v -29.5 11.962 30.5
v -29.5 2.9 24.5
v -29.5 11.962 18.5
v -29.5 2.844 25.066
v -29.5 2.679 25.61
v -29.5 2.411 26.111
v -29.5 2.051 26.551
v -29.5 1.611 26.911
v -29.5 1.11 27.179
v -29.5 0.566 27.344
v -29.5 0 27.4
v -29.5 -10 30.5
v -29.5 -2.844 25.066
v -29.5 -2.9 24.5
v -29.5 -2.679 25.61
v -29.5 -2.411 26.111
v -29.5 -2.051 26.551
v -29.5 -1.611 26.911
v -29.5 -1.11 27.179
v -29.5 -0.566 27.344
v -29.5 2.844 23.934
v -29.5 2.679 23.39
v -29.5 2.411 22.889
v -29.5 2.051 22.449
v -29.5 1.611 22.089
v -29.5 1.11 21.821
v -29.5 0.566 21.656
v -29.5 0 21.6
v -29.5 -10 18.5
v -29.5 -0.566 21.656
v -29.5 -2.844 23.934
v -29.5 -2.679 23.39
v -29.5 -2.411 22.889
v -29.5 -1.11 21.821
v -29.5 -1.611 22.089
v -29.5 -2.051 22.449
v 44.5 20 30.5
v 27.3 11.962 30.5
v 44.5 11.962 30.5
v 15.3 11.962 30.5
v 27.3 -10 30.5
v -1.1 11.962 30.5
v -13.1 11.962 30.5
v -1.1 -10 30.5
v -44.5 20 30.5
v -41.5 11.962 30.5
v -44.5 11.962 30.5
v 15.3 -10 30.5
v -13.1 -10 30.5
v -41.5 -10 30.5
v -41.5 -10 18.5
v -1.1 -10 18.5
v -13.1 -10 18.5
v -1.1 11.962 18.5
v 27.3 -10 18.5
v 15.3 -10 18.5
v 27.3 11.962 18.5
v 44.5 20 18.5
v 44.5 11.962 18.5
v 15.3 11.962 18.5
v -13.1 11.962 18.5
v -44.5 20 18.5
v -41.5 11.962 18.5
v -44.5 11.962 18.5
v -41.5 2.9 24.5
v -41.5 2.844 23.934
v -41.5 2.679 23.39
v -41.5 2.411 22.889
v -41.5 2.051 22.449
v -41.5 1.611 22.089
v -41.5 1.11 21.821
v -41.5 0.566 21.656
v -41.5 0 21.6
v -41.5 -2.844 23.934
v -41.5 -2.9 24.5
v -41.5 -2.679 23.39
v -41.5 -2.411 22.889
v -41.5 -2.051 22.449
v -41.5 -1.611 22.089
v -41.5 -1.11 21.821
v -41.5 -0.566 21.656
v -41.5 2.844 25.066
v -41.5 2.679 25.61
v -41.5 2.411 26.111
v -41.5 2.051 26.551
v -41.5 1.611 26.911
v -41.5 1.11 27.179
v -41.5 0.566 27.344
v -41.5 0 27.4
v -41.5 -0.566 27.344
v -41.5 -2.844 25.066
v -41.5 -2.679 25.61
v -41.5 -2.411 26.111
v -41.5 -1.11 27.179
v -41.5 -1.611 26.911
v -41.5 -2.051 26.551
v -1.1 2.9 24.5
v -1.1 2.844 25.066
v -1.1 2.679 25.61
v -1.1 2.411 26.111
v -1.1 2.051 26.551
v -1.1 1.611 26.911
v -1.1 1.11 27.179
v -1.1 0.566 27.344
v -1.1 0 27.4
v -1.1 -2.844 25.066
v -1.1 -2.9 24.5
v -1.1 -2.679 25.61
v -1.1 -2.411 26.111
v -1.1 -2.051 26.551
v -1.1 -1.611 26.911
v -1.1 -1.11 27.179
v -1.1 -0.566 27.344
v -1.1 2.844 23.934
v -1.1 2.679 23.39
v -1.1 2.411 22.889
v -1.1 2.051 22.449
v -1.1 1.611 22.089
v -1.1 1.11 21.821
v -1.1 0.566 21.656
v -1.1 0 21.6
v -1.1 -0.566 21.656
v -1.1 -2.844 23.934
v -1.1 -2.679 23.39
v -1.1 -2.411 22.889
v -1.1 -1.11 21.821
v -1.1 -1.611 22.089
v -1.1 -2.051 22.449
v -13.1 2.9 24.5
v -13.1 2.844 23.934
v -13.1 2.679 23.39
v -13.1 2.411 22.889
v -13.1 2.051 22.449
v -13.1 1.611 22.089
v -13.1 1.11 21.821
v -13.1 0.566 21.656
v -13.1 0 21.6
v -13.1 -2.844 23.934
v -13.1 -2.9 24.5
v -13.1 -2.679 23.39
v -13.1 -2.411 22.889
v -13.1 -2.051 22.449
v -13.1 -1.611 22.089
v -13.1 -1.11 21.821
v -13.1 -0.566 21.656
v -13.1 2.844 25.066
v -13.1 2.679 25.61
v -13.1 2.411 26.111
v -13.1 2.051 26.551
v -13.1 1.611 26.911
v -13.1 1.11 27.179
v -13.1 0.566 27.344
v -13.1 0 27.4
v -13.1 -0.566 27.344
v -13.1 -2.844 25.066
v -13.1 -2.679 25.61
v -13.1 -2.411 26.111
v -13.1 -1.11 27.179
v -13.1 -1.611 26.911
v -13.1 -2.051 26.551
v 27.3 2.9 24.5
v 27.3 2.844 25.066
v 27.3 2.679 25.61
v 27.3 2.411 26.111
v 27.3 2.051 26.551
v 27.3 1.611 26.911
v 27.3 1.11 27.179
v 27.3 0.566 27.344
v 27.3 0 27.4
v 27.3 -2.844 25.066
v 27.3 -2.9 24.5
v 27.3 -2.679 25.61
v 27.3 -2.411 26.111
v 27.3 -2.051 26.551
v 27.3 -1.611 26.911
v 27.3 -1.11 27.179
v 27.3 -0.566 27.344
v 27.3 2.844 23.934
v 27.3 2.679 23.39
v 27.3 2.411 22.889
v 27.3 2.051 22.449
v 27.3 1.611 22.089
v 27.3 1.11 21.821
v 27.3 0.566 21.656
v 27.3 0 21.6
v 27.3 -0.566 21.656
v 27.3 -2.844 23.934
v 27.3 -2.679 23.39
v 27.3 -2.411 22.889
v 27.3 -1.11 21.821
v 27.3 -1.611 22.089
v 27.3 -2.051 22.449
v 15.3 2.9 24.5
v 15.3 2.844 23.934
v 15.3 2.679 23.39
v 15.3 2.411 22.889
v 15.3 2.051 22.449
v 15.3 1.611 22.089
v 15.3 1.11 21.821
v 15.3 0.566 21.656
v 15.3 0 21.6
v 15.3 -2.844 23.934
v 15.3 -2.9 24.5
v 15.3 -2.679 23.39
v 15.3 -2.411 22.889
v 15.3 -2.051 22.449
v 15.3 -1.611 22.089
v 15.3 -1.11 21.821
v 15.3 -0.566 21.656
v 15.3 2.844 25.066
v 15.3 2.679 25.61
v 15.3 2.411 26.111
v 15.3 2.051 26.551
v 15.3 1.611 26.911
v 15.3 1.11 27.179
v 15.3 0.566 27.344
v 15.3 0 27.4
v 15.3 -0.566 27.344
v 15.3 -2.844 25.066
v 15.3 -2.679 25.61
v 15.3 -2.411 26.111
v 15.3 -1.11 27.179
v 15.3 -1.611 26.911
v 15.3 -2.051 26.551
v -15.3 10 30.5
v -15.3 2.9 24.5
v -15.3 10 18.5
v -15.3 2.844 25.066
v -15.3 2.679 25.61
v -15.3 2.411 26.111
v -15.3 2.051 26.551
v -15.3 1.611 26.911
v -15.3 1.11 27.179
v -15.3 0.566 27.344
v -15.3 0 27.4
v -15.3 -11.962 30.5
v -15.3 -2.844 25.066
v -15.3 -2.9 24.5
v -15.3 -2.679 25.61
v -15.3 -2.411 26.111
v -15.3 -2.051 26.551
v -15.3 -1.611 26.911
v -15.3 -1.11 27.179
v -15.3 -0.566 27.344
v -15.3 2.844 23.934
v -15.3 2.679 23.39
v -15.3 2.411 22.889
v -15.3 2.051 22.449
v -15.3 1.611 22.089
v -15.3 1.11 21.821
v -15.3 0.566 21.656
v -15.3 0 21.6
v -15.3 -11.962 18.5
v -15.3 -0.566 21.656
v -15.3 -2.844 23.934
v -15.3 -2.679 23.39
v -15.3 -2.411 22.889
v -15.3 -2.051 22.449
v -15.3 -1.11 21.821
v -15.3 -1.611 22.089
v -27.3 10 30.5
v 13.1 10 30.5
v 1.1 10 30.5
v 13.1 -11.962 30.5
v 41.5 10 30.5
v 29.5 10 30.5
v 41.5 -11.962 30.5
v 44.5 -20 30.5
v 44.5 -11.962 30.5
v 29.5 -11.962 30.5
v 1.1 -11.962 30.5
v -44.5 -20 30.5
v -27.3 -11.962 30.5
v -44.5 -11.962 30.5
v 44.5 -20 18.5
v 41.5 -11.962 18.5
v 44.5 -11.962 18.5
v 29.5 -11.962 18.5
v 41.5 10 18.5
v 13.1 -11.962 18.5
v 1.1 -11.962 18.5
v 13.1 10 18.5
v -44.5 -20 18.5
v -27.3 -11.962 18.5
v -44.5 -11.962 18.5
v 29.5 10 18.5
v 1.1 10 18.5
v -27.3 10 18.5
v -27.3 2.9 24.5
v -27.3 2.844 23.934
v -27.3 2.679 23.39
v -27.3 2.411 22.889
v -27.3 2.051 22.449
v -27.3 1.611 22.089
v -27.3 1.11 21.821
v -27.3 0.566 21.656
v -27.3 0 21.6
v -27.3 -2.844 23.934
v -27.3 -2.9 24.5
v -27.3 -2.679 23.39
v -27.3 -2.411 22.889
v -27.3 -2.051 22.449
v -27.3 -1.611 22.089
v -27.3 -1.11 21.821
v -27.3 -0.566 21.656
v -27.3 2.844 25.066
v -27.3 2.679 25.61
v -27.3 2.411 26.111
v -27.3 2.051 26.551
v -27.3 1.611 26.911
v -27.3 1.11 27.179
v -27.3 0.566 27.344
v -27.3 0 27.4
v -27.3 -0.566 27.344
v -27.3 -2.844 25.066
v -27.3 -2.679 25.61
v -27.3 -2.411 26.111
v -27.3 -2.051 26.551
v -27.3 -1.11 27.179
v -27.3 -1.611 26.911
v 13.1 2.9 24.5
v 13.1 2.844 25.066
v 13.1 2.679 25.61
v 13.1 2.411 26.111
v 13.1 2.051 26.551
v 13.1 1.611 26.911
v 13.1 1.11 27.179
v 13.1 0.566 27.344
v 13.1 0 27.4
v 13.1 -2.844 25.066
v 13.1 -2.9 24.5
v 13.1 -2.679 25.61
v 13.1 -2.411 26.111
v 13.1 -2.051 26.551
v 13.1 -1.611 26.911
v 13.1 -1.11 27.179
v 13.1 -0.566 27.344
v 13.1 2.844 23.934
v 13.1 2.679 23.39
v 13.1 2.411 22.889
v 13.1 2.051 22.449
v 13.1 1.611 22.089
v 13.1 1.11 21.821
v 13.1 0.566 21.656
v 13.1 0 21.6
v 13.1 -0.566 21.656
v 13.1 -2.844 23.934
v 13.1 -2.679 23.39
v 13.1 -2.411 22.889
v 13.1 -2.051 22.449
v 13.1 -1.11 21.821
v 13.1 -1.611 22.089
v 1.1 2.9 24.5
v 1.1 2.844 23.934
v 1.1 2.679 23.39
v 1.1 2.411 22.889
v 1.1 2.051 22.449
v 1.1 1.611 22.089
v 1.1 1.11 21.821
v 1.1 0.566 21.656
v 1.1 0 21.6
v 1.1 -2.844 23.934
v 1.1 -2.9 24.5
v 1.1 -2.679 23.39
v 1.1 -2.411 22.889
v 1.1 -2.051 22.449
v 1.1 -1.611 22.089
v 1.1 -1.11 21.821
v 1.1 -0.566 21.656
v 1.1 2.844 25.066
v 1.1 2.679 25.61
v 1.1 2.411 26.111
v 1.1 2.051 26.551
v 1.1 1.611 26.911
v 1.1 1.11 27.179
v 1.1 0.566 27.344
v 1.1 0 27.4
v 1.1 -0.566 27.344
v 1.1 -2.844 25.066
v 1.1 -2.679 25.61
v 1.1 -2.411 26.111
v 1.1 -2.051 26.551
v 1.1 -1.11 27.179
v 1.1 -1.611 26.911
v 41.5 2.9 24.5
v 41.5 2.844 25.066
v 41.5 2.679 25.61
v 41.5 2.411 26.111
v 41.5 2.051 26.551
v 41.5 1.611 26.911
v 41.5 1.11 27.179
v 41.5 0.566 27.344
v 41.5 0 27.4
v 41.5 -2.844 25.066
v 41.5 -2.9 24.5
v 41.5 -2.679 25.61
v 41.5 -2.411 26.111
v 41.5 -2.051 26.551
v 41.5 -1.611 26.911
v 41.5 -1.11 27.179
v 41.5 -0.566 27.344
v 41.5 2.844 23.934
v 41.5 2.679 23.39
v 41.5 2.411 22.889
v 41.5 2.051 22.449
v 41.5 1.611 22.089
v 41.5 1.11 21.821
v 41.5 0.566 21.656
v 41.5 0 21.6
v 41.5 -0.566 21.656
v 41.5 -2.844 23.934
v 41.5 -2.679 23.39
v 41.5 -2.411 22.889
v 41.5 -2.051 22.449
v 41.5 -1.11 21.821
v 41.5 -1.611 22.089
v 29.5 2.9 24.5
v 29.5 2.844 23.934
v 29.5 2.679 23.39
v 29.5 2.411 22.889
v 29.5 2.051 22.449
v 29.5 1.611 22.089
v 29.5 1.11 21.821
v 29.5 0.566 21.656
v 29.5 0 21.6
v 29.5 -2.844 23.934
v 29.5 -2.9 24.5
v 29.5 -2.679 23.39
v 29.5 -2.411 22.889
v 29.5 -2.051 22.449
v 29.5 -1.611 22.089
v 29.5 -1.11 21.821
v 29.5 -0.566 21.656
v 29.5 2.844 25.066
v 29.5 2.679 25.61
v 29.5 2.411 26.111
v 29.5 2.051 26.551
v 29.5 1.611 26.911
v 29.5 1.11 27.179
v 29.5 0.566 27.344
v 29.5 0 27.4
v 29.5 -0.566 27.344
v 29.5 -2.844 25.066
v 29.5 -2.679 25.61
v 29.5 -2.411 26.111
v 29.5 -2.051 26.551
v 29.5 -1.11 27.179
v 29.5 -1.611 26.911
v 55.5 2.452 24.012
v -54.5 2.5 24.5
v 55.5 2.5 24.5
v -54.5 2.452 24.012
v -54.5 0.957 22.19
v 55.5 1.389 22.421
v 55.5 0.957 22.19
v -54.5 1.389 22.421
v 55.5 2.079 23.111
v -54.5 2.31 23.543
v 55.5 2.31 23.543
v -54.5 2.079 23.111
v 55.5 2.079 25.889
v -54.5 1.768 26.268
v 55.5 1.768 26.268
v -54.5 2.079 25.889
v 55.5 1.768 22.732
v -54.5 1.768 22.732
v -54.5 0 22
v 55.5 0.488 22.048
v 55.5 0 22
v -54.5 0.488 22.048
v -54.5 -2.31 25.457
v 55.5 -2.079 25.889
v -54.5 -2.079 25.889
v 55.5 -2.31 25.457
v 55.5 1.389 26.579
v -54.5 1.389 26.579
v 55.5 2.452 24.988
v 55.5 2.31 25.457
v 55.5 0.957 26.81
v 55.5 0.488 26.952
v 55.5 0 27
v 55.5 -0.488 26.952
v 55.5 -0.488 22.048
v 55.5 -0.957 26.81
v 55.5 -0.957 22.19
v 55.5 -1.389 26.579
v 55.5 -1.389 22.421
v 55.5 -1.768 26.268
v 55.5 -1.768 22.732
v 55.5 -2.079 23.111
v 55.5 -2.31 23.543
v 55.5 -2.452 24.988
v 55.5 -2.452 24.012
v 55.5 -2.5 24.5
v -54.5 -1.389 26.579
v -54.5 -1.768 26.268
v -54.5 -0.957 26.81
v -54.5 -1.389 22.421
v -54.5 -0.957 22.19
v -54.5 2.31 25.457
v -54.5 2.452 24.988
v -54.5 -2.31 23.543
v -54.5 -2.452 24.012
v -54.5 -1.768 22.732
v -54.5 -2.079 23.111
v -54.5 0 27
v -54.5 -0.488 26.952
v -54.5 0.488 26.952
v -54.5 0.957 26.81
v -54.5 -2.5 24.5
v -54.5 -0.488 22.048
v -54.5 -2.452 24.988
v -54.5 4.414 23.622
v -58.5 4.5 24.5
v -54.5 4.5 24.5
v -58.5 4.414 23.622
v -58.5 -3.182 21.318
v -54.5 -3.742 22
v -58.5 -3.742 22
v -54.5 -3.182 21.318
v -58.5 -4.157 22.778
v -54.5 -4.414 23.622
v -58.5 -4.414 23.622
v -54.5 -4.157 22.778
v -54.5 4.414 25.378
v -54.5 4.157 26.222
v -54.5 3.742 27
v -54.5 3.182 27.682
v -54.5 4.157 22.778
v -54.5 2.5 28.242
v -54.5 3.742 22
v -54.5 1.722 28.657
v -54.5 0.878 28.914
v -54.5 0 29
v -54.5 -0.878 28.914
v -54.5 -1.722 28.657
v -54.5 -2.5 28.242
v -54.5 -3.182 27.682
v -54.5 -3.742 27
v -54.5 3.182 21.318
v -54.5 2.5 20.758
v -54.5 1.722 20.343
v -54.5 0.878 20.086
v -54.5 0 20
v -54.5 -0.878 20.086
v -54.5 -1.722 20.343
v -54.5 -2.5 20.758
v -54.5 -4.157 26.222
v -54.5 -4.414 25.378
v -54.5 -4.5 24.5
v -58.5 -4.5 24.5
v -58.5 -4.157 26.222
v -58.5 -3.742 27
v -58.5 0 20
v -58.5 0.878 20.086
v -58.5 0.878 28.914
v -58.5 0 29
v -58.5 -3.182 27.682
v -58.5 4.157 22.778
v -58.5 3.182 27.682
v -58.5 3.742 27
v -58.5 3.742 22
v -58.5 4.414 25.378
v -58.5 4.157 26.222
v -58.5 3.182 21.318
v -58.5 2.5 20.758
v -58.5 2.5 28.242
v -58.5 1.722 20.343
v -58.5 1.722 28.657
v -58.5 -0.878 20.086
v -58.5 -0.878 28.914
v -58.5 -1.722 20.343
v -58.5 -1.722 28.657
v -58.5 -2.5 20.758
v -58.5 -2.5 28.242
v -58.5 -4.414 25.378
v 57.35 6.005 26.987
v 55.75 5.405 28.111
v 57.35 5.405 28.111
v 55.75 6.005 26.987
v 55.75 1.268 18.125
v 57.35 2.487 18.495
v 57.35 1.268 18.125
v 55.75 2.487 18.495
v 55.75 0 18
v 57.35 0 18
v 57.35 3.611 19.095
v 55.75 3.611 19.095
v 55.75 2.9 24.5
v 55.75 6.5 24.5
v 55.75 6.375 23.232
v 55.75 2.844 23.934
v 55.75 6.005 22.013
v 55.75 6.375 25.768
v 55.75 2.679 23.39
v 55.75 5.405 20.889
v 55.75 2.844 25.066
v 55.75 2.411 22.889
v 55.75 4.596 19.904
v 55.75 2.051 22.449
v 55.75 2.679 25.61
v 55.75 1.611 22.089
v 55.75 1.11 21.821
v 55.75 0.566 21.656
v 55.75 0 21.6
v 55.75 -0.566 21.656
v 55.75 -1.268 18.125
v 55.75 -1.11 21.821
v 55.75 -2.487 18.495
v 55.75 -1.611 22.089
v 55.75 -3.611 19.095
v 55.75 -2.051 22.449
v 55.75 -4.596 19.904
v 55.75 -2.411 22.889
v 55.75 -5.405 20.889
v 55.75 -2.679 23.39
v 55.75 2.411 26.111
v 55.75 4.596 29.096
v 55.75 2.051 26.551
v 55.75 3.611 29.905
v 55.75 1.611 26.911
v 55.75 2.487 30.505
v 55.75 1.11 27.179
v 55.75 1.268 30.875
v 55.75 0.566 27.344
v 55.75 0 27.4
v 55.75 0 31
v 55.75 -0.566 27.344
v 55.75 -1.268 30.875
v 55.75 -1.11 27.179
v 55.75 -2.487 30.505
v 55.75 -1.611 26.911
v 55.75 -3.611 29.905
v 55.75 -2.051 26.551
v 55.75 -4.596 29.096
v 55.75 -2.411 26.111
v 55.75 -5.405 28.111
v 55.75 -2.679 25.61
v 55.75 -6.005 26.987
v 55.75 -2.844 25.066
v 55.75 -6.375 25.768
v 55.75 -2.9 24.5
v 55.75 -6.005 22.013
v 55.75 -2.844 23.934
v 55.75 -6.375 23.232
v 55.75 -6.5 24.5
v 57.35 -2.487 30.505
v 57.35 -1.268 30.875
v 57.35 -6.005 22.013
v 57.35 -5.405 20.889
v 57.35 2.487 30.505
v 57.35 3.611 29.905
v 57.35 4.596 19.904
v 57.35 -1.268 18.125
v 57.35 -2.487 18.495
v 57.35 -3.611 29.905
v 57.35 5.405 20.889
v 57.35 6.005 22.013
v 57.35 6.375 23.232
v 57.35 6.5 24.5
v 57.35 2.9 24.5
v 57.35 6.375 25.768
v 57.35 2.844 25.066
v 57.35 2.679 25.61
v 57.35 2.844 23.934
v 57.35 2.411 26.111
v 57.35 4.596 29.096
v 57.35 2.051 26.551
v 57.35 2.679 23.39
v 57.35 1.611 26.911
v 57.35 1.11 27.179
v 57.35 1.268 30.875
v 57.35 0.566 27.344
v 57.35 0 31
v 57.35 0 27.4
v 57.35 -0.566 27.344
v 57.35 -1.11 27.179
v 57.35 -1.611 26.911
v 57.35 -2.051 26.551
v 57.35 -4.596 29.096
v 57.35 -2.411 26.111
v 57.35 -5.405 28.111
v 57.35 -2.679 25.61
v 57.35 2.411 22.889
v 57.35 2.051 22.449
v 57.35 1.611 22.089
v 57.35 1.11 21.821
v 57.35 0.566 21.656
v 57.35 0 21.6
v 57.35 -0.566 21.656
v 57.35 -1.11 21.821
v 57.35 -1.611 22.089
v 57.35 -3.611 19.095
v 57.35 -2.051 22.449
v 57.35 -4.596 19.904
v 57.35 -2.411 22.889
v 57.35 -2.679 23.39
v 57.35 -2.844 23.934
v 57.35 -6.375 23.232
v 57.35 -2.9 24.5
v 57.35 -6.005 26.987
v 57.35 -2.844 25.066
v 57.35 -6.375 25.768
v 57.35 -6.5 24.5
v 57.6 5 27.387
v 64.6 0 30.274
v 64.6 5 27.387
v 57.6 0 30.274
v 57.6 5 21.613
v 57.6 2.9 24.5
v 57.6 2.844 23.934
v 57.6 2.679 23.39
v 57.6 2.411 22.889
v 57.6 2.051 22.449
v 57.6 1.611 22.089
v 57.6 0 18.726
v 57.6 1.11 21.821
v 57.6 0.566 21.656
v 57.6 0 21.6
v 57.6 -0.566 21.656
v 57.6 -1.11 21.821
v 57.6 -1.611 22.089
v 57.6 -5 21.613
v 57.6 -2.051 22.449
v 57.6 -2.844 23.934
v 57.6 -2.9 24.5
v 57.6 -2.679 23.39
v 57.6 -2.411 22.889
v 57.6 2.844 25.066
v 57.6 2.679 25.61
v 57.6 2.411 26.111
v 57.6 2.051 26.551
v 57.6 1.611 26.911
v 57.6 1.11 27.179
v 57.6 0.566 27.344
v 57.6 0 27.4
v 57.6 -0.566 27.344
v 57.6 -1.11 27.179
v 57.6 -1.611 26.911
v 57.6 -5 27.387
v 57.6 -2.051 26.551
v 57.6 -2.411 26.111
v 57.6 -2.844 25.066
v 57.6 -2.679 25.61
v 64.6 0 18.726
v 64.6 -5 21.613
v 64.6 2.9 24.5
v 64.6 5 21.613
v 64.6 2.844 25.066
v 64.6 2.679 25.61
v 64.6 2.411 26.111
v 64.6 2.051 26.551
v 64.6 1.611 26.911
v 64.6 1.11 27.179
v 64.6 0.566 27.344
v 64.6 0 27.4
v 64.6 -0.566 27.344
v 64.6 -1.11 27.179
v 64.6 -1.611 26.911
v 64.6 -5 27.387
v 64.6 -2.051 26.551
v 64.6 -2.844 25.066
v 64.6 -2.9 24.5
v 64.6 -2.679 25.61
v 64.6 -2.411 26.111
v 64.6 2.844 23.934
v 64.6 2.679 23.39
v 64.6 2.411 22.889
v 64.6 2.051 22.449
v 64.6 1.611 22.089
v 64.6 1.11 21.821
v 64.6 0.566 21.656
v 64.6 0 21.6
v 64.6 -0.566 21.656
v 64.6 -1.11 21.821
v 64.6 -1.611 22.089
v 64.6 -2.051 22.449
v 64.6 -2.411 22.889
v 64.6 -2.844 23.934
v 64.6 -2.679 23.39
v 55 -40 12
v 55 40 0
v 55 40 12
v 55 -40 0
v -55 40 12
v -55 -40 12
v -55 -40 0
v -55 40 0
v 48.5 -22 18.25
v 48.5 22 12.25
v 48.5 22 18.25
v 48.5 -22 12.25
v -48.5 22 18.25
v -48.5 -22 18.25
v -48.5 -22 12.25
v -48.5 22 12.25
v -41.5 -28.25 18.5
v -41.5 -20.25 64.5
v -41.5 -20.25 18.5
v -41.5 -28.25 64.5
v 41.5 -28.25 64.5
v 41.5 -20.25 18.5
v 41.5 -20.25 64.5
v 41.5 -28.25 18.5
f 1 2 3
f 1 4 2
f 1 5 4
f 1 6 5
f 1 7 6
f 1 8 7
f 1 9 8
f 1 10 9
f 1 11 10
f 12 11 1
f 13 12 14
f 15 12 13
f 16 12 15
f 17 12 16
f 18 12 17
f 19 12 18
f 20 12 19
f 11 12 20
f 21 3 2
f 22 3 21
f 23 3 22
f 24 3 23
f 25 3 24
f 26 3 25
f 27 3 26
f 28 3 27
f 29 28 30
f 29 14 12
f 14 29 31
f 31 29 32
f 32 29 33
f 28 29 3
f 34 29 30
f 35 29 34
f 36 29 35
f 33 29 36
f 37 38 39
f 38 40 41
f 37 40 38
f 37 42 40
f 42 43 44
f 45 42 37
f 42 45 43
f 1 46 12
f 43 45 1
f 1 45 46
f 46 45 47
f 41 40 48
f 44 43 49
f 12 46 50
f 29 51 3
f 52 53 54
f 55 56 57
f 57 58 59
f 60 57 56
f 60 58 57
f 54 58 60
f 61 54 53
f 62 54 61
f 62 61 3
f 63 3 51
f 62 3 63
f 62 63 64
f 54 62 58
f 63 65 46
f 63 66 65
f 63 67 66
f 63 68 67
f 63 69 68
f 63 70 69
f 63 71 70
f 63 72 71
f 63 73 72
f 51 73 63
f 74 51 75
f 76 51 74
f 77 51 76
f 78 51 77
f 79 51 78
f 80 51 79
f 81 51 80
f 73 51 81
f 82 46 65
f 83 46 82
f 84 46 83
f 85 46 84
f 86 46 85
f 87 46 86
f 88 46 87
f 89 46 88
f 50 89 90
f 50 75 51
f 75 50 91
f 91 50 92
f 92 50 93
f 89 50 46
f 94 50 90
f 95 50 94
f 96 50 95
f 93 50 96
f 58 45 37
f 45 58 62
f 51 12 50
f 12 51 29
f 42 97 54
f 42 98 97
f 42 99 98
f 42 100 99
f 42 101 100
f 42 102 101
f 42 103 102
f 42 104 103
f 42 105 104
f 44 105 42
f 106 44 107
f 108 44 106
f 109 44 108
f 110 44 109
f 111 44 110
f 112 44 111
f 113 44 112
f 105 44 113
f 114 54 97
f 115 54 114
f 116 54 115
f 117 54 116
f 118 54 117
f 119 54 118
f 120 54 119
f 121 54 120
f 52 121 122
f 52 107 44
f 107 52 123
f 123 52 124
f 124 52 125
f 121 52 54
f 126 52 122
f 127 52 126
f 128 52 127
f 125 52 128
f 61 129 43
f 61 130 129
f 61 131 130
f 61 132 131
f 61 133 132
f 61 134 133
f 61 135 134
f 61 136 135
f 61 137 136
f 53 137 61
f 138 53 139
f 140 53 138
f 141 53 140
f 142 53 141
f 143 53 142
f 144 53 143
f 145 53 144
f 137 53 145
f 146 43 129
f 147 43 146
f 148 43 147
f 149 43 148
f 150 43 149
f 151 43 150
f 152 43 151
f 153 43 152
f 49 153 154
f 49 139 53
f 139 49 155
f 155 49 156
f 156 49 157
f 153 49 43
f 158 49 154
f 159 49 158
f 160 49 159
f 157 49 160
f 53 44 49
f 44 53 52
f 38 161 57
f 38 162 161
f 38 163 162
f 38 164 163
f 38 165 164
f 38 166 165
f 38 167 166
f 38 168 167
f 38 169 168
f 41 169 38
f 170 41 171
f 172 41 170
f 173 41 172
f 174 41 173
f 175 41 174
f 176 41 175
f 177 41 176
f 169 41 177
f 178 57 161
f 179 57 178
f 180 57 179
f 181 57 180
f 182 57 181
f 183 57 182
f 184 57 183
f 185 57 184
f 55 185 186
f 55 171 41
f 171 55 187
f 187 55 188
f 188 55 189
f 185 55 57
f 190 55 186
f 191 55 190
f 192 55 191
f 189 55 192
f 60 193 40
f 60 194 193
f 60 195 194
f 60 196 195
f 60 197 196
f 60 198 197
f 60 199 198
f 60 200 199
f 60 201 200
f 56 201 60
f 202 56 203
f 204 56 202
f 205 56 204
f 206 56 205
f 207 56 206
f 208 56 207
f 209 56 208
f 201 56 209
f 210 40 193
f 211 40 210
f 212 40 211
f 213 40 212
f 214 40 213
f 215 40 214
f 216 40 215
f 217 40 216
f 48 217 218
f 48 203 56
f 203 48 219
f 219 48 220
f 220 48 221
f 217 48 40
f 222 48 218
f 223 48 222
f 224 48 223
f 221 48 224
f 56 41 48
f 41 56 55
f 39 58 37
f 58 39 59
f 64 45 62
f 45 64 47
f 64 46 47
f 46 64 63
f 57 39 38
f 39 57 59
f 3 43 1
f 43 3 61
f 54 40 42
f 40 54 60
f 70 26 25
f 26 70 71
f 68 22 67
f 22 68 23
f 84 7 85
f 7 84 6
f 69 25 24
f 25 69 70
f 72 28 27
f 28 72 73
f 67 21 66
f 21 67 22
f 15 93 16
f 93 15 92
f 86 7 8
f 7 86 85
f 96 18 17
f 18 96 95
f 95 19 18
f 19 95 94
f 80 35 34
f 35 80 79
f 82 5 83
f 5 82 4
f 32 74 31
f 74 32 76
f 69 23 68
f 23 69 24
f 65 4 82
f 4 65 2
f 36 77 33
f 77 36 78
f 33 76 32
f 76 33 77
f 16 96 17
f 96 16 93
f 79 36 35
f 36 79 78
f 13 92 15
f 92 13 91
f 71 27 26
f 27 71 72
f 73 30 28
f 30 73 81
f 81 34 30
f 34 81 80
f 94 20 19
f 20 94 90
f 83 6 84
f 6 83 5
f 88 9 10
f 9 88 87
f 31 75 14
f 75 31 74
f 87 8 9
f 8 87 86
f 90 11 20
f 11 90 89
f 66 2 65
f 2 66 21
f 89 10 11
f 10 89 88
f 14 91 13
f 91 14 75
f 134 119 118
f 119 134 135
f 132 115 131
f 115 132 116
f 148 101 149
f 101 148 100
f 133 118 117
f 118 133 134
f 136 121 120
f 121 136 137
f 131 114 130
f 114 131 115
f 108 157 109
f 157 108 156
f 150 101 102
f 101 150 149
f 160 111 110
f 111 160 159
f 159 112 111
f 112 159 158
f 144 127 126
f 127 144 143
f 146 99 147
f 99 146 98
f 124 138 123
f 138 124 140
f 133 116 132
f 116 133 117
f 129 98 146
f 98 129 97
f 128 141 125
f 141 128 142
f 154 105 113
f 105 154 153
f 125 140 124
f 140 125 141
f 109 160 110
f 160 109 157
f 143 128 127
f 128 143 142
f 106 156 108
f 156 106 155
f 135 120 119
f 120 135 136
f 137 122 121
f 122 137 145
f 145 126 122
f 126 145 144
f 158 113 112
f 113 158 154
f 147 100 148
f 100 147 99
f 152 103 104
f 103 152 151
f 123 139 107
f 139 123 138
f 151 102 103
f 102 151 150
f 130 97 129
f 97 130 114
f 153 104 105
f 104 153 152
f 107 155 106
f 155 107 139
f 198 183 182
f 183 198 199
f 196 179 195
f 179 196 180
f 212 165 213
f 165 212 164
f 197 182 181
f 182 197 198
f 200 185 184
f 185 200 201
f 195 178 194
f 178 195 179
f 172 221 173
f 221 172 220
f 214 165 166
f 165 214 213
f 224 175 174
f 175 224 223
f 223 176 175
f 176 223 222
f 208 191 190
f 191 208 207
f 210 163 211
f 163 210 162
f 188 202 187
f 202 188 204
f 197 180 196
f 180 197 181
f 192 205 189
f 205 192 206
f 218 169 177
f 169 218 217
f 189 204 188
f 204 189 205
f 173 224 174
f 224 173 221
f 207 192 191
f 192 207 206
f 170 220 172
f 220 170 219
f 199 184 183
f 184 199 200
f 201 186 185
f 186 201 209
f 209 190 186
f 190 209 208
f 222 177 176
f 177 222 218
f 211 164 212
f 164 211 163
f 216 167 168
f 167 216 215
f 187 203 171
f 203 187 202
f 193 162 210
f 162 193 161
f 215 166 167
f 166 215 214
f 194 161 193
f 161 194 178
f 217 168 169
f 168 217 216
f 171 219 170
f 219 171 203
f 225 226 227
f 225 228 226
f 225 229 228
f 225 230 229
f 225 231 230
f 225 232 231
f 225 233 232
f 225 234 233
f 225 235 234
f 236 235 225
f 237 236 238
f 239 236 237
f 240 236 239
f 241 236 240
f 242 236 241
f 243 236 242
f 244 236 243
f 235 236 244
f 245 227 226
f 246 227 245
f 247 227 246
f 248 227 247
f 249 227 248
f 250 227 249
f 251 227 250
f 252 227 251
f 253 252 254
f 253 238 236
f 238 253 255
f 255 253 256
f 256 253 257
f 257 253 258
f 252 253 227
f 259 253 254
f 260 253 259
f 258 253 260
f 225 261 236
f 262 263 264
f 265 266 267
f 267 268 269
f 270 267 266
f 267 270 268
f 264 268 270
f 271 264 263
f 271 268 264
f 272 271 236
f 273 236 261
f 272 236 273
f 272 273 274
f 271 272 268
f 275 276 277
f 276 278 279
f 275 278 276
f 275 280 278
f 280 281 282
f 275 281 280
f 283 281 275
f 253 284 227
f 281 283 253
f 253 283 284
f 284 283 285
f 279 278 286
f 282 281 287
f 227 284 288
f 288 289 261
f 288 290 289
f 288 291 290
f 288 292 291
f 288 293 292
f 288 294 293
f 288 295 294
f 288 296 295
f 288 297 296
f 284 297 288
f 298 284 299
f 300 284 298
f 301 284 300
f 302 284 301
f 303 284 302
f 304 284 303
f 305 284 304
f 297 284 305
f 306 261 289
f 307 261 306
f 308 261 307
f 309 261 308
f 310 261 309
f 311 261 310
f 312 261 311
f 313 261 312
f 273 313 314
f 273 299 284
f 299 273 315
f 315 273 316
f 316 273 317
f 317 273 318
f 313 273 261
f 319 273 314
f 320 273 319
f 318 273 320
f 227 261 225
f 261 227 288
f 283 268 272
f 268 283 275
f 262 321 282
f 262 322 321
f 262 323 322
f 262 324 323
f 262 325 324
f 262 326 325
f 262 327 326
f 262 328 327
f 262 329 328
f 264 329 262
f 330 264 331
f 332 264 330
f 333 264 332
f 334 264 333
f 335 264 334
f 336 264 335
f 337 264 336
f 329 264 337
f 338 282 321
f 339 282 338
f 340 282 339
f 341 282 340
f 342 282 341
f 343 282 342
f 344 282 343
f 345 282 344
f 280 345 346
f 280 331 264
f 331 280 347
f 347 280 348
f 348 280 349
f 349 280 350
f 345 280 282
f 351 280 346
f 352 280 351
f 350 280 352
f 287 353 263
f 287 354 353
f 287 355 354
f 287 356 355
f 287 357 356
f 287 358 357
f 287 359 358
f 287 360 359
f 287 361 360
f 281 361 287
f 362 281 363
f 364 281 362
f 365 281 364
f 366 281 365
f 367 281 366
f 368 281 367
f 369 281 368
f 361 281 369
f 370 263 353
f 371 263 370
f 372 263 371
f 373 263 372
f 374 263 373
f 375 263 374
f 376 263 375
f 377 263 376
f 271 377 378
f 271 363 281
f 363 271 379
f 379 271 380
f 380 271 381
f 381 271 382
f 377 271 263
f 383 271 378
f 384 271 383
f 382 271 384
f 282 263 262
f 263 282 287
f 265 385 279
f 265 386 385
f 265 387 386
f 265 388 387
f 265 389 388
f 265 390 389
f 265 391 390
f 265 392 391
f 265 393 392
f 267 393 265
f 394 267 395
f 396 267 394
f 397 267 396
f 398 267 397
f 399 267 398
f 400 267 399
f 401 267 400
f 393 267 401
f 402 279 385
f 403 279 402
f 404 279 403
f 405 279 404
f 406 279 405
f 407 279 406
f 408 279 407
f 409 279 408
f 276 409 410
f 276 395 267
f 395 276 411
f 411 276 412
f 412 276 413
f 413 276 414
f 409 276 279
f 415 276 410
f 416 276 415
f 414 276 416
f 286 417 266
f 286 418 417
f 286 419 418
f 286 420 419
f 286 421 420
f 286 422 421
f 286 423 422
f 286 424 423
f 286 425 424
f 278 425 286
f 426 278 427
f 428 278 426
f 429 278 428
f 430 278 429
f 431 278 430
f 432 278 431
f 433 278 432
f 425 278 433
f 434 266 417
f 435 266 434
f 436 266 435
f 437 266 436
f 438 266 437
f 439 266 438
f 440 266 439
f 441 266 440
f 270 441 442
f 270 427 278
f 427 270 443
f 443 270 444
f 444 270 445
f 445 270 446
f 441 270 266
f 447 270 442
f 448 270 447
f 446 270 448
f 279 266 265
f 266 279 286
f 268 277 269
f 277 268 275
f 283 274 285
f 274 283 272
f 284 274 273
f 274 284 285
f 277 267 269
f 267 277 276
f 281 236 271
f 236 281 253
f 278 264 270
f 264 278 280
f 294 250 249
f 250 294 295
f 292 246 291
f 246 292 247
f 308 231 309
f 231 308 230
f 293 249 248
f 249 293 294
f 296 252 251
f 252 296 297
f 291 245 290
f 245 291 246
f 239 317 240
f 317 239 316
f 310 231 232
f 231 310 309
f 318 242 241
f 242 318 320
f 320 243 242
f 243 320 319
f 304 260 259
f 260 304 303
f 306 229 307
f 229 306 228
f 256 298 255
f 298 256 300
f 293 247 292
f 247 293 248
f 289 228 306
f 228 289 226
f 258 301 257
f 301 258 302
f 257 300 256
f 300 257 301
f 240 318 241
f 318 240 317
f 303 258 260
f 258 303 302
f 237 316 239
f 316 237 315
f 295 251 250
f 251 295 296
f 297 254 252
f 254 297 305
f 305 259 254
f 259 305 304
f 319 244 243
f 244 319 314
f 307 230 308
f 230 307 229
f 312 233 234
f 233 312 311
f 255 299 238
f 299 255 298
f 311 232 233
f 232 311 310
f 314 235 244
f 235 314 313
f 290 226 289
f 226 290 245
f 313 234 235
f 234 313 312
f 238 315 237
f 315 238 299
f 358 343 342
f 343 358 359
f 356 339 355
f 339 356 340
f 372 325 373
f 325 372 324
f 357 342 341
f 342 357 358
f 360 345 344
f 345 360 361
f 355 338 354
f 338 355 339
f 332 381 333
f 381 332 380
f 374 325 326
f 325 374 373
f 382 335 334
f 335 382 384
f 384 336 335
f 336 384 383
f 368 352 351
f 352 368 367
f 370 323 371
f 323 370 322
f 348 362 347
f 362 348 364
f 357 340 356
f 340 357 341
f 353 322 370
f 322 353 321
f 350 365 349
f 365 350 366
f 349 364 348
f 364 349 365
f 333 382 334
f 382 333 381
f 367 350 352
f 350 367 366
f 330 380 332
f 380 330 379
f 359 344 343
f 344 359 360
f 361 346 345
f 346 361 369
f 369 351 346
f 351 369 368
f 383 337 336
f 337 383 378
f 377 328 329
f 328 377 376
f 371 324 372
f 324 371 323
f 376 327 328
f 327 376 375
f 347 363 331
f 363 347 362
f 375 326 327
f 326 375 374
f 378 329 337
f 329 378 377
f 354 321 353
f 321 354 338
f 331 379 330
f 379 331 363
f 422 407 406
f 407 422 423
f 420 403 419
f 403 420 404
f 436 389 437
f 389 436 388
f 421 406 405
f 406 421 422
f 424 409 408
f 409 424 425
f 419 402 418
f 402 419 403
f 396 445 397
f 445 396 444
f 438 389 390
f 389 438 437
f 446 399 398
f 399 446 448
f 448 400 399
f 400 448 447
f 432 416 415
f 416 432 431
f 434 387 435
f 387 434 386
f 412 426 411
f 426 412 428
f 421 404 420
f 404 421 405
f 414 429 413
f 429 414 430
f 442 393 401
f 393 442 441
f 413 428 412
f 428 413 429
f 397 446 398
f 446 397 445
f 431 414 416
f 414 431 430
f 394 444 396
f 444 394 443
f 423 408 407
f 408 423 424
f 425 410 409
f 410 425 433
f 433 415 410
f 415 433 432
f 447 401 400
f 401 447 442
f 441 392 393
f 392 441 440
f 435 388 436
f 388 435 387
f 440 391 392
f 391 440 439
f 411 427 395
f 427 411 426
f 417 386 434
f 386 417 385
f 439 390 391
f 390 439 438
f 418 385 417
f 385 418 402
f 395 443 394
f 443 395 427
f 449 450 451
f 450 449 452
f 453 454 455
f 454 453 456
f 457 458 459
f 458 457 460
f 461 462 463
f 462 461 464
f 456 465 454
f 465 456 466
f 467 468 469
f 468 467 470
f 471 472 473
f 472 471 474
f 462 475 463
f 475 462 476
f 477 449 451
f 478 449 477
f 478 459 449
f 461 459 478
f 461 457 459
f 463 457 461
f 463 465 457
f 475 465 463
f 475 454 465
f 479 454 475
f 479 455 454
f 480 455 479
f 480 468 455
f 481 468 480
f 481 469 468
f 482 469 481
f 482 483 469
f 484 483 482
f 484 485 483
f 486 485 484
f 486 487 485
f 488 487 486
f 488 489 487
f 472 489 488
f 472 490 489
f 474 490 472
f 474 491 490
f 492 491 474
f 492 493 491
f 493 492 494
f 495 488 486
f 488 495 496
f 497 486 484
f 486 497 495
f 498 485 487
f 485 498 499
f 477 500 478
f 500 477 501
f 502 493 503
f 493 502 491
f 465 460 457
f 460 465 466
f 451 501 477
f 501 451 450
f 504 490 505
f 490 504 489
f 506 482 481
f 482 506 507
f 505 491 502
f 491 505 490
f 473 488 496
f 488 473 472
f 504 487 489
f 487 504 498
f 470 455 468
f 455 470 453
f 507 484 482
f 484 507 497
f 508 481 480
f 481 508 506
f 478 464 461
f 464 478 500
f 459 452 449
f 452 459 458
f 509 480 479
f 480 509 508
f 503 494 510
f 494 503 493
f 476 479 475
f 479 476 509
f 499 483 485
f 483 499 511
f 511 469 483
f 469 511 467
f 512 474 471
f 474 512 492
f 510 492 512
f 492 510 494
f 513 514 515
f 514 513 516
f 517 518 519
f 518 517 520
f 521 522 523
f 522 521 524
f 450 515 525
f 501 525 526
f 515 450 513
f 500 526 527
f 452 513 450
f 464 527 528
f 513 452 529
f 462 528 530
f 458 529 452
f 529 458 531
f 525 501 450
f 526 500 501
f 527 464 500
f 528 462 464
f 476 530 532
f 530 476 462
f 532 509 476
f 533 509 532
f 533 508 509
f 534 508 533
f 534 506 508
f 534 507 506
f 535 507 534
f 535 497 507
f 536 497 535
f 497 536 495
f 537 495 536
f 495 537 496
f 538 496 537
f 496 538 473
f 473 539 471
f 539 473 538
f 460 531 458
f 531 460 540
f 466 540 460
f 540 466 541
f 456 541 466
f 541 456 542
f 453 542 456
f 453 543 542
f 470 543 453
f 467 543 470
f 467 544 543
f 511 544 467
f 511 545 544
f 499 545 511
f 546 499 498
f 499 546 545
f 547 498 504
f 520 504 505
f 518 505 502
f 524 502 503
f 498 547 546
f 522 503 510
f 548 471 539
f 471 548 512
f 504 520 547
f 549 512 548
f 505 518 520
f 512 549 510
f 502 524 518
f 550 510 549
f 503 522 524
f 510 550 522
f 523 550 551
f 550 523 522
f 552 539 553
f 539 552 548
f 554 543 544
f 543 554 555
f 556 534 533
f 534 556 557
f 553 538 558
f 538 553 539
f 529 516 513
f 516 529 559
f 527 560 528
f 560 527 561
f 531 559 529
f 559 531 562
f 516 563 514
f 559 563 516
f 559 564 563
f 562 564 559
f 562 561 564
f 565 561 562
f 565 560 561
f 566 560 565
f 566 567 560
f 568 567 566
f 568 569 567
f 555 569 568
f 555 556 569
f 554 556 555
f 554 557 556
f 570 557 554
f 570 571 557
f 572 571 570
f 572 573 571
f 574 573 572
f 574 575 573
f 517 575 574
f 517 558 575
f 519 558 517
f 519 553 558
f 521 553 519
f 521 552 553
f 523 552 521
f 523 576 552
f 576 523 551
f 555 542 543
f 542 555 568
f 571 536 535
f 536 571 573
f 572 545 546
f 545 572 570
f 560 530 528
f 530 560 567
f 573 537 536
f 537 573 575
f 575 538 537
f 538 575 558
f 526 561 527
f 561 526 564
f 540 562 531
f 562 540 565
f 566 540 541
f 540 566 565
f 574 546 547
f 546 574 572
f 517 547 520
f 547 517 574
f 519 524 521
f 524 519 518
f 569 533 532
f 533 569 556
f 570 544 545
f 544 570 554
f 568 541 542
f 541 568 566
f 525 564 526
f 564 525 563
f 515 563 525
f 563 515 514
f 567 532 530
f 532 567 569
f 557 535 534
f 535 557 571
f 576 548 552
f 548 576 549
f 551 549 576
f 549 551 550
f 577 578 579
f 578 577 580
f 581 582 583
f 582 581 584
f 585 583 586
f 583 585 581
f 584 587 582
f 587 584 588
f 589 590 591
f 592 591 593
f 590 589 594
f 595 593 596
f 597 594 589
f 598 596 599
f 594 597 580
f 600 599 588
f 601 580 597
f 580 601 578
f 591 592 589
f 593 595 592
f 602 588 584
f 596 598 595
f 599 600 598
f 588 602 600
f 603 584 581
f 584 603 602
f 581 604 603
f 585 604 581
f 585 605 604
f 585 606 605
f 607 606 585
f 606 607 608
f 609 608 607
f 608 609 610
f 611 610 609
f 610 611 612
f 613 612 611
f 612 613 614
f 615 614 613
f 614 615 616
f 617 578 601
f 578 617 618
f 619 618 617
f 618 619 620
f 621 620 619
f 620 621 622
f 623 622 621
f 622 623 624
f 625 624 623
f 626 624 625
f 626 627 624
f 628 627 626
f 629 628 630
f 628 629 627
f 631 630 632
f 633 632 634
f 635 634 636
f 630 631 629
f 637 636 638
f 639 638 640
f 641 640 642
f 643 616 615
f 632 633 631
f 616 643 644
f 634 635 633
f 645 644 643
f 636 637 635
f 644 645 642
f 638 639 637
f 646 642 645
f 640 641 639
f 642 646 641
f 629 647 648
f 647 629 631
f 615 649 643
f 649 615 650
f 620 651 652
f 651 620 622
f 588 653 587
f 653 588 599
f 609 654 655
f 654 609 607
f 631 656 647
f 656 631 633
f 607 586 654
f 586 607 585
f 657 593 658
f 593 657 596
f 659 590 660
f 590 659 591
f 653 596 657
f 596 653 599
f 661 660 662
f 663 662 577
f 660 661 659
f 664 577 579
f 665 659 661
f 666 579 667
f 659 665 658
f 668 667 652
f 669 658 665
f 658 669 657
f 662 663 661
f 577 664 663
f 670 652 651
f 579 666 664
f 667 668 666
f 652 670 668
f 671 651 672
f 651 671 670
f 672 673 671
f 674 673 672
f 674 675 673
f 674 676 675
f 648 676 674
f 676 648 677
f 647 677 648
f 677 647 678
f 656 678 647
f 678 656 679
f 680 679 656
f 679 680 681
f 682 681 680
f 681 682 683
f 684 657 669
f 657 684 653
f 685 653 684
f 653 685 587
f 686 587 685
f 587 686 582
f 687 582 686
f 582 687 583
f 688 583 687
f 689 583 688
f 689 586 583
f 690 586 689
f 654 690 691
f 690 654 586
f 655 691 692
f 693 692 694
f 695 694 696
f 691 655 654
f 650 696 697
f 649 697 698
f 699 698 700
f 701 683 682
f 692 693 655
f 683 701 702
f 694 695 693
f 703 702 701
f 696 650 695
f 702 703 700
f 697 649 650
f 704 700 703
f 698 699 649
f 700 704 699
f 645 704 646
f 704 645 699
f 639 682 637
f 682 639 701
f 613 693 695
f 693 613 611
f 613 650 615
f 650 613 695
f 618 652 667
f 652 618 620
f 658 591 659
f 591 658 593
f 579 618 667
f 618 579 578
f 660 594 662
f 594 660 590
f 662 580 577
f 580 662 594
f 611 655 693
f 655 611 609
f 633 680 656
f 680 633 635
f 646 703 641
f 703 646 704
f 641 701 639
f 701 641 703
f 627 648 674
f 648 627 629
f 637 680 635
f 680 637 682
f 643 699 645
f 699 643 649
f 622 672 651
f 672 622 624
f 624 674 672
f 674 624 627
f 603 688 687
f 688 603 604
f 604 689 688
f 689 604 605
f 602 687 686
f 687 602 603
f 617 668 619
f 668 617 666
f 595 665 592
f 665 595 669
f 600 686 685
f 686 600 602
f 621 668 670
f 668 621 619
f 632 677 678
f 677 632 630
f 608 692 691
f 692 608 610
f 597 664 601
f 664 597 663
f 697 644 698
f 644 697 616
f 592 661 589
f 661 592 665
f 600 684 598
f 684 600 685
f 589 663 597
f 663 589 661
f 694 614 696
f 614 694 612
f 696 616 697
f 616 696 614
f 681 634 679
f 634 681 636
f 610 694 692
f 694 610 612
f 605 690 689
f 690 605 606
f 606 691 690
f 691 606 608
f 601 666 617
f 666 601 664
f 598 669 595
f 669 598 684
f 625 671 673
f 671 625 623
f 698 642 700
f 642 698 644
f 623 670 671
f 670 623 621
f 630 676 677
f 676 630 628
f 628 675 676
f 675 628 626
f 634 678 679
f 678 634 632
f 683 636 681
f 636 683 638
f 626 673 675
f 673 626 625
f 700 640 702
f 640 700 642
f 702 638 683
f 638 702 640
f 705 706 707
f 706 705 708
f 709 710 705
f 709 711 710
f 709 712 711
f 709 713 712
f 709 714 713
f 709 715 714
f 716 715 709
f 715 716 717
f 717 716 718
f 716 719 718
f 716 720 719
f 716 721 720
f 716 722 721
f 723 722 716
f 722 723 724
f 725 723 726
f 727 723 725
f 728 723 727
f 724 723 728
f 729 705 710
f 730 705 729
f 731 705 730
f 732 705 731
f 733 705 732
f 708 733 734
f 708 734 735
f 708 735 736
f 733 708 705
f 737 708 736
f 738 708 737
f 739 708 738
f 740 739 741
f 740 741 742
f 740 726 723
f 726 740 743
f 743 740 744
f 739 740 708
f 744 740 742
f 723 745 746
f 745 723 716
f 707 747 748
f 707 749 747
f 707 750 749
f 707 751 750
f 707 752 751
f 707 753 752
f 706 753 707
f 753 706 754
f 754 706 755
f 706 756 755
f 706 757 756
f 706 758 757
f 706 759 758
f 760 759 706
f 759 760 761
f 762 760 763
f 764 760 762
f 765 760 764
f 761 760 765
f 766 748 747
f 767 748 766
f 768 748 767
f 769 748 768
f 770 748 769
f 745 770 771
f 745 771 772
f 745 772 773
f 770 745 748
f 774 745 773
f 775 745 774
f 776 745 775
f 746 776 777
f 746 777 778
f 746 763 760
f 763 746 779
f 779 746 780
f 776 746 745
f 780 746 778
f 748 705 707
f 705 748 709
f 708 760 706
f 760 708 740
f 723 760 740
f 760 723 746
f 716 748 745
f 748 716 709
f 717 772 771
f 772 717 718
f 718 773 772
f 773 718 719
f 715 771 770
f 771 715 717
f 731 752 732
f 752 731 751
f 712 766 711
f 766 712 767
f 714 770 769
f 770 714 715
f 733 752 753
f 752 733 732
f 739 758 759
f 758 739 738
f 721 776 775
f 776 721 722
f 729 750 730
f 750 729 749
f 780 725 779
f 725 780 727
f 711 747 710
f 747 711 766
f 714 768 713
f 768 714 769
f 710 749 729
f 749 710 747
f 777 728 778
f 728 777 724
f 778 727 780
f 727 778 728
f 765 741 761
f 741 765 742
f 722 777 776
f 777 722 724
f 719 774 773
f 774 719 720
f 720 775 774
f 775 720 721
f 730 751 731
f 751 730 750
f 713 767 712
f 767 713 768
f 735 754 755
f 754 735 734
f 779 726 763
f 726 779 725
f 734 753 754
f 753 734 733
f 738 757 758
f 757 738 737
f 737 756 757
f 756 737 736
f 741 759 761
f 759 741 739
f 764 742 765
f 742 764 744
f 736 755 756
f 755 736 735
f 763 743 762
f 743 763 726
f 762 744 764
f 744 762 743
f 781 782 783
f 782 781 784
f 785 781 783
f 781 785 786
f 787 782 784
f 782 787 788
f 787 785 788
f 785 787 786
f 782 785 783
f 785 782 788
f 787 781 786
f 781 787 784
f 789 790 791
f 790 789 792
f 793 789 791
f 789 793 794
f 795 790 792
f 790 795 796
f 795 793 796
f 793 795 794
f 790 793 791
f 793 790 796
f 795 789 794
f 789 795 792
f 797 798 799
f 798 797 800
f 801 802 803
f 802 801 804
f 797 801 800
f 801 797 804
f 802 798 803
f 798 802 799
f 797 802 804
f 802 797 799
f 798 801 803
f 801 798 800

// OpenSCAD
$fn = 32;

// ------------------------------------------------------------------------
// Comb hinge with flap: leaf 89 x 20 mm, pin d5, flap 46 mm
// Every part is its own module, assembly() places every instance.
// ------------------------------------------------------------------------

// --- part 1 ---
module hinge_bed() {
  difference() {
    translate([-55, -40, 0]) cube([110, 80, 12]);
  }
}

// --- part 2 ---
module hinge_riser() {
  difference() {
    translate([-48.5, -22, 0]) cube([97, 44, 6]);
  }
}

// --- part 3 ---
module hinge_leaf_a() {
  difference() {
    union() {
      translate([-41.5, -10, -6]) cube([12, 30, 12]);
      translate([-13.1, -10, -6]) cube([12, 30, 12]);
      translate([15.3, -10, -6]) cube([12, 30, 12]);
      translate([-44.5, 11.962, -6]) cube([89, 8.038, 12]);
    }
    translate([-35.5, 0, 0]) rotate([0, 90, 0]) cylinder(h = 14, d = 5.8, center = true);
    translate([-7.1, 0, 0]) rotate([0, 90, 0]) cylinder(h = 14, d = 5.8, center = true);
    translate([21.3, 0, 0]) rotate([0, 90, 0]) cylinder(h = 14, d = 5.8, center = true);
  }
}

// --- part 4 ---
module hinge_leaf_b() {
  difference() {
    union() {
      translate([-27.3, -20, -6]) cube([12, 30, 12]);
      translate([1.1, -20, -6]) cube([12, 30, 12]);
      translate([29.5, -20, -6]) cube([12, 30, 12]);
      translate([-44.5, -20, -6]) cube([89, 8.038, 12]);
    }
    translate([-21.3, 0, 0]) rotate([0, 90, 0]) cylinder(h = 14, d = 5.8, center = true);
    translate([7.1, 0, 0]) rotate([0, 90, 0]) cylinder(h = 14, d = 5.8, center = true);
    translate([35.5, 0, 0]) rotate([0, 90, 0]) cylinder(h = 14, d = 5.8, center = true);
  }
}

// --- part 5 ---
module hinge_flap() {
  difference() {
    translate([-41.5, -23, 0]) cube([83, 46, 8]);
  }
}

// --- part 6 ---
module hinge_pin() {
  rotate([0, 90, 0]) cylinder(h = 111, d = 5, center = true);
  translate([-58.5, 0, 0]) rotate([0, 90, 0]) cylinder(h = 4, d = 9);
}

// --- part 7 ---
module pin_washer() {
  difference() {
      translate([0, 0, 0]) cylinder(h = 1.6, d = 13);
      translate([0, 0, -1]) cylinder(h = 3.6, d = 5.8);
    }
}

// --- part 8 ---
module pin_nut() {
  difference() {
    linear_extrude(height = 7) polygon(points = [[5.774, 0], [2.887, 5], [-2.887, 5], [-5.774, 0], [-2.887, -5], [2.887, -5]]);
    translate([0, 0, -1]) cylinder(h = 9, d = 5.8);
  }
}

// --- assembly ---
module assembly() {
  color([0.80, 0.24, 0.20]) translate([0, 0, 0]) rotate([0, 0, 0]) hinge_bed();
  color([0.20, 0.45, 0.75]) translate([0, 0, 12.25]) rotate([0, 0, 0]) hinge_riser();
  color([0.25, 0.62, 0.32]) translate([0, 0, 24.5]) rotate([0, 0, 0]) hinge_leaf_a();
  color([0.92, 0.70, 0.18]) translate([0, 0, 24.5]) rotate([0, 0, 0]) hinge_leaf_b();
  color([0.58, 0.35, 0.70]) translate([0, -20.25, 41.5]) rotate([90, 0, 0]) hinge_flap();
  color([0.16, 0.66, 0.66]) translate([0, 0, 24.5]) rotate([0, 0, 0]) hinge_pin();
  color([0.85, 0.48, 0.18]) translate([55.75, 0, 24.5]) rotate([0, 90, 0]) pin_washer();
  color([0.55, 0.60, 0.65]) translate([57.6, 0, 24.5]) rotate([0, 90, 0]) pin_nut();
}

assembly();
